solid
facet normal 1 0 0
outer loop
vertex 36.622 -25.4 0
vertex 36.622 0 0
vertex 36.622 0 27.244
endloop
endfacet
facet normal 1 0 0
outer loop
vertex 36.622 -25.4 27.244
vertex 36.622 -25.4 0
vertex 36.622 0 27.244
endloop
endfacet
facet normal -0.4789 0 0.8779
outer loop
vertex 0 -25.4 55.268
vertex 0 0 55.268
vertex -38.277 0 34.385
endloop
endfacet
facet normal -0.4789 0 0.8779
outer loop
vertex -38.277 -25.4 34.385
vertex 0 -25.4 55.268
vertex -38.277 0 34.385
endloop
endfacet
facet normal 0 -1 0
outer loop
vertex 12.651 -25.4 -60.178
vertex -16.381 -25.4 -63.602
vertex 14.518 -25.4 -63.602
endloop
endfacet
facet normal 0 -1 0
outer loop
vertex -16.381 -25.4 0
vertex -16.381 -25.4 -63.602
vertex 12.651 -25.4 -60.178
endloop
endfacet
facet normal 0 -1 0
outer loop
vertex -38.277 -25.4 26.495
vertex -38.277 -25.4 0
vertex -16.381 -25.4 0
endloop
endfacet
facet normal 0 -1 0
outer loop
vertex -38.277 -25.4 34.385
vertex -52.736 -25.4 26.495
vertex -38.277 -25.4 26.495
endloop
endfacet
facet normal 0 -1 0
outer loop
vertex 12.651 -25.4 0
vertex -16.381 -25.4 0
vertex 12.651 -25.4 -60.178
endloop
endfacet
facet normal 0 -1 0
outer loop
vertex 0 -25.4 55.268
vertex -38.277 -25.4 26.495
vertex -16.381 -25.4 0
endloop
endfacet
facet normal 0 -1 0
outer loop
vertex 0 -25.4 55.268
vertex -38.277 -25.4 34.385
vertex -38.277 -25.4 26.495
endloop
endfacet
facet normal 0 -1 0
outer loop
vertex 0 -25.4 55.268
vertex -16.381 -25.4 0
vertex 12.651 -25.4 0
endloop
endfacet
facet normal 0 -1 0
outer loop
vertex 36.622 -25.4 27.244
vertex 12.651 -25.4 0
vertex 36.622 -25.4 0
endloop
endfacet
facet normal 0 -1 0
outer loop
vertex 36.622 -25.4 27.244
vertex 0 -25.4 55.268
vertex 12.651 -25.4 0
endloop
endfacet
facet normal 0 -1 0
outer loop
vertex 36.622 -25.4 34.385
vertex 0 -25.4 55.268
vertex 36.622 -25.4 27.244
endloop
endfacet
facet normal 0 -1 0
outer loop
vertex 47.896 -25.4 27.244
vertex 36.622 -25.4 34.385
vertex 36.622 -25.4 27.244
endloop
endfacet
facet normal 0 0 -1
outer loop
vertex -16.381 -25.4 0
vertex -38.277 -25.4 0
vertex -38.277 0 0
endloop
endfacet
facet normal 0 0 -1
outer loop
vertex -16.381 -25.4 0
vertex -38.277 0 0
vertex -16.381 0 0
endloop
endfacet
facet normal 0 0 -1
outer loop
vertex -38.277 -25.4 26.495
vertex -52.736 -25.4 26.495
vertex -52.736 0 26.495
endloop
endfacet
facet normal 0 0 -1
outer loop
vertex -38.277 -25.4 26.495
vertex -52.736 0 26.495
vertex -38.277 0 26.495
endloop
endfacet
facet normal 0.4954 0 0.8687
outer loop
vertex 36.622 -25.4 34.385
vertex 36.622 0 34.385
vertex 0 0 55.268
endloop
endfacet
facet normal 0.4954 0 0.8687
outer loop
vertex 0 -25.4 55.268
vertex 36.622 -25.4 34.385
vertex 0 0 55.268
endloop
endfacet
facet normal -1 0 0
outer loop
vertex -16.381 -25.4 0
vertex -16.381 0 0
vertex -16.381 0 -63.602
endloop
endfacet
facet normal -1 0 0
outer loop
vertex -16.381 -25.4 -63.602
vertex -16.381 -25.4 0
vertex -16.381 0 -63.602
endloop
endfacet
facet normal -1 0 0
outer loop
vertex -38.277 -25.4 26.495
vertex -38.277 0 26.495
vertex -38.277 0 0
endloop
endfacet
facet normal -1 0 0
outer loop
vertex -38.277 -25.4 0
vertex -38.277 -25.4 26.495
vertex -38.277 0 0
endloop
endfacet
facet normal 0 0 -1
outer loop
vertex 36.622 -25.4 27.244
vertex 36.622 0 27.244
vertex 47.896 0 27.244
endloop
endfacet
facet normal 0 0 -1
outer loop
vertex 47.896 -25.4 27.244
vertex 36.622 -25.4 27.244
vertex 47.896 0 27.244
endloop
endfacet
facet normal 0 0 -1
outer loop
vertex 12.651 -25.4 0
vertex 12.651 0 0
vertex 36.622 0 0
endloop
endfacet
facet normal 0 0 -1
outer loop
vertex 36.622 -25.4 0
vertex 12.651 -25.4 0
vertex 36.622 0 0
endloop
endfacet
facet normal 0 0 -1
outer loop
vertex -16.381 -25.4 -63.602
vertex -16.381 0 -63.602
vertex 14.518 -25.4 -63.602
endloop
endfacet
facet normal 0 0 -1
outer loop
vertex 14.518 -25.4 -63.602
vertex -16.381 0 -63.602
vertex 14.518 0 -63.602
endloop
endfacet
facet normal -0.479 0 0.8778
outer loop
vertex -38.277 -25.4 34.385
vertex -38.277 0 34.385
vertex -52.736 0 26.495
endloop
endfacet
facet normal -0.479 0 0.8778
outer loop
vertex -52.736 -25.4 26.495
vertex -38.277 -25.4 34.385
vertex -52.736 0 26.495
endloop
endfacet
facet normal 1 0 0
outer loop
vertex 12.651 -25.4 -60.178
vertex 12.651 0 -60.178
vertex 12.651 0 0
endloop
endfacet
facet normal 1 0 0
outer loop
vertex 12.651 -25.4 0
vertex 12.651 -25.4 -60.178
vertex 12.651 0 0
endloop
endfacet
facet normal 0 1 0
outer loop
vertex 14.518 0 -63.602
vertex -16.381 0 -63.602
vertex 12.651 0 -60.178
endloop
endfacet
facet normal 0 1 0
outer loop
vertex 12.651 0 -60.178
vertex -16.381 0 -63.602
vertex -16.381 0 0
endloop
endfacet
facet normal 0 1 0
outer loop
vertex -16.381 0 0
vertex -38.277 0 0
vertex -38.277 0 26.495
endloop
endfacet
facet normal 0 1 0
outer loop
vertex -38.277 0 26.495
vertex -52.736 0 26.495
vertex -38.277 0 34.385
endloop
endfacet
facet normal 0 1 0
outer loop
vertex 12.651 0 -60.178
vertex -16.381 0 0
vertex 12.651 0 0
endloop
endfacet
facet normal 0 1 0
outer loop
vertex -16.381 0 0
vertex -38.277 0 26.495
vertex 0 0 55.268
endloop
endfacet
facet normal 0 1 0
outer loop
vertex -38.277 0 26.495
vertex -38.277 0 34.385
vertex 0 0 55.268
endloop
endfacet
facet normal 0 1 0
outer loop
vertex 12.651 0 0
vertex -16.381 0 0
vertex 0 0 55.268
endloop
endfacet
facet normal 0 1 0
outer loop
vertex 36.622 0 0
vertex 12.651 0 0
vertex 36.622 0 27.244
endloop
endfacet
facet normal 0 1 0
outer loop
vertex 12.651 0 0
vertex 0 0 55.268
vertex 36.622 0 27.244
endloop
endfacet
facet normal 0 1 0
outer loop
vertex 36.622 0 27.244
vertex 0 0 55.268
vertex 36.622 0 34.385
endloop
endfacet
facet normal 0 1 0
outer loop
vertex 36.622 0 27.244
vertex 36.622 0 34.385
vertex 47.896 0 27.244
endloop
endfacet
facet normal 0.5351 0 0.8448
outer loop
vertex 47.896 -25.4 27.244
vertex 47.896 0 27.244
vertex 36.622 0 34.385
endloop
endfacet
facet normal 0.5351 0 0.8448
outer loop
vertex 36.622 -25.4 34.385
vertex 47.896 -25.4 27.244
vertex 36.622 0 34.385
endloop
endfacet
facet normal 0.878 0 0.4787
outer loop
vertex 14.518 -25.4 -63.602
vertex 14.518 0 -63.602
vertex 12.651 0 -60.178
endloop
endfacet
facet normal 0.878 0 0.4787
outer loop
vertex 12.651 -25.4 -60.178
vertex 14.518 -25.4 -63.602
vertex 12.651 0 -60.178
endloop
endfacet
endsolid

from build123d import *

# Parameters (mm, degrees)
F1_DEPTH = 25.4


with BuildPart() as f1:
    # F0 (on Front) → F1 (new body)
    with BuildSketch(Plane.XZ):
        Polygon((36.621895, 34.384649), (0, 55.268008), (-38.276557, 34.384649), (-29.714473, 34.384649), (-17.944092, 34.384649), align=None)
        Polygon((-38.276557, 26.495456), (-38.276557, 34.384649), (-52.73645, 26.495456), align=None)
        Polygon((-29.714473, 34.384649), (-38.276557, 34.384649), (-38.276557, 26.495456), (-38.276557, 0), (-29.714473, 0), (-16.381497, 0), (12.651484, 0), (36.621895, 0), (36.621895, 27.243869), (36.621895, 33.672655), (36.621895, 34.384649), (-17.944092, 34.384649), align=None)
        Polygon((47.895672, 27.243869), (36.621895, 34.384649), (36.621895, 33.672655), align=None)
        Polygon((47.895672, 27.243869), (36.621895, 33.672655), (36.621895, 27.243869), align=None)
        Polygon((12.651484, 0), (-16.381497, 0), (-16.381497, -57.907131), (-16.381497, -63.601866), (14.517904, -63.601866), (12.651484, -60.177624), align=None)
    extrude(amount=F1_DEPTH)


solid = f1.part
